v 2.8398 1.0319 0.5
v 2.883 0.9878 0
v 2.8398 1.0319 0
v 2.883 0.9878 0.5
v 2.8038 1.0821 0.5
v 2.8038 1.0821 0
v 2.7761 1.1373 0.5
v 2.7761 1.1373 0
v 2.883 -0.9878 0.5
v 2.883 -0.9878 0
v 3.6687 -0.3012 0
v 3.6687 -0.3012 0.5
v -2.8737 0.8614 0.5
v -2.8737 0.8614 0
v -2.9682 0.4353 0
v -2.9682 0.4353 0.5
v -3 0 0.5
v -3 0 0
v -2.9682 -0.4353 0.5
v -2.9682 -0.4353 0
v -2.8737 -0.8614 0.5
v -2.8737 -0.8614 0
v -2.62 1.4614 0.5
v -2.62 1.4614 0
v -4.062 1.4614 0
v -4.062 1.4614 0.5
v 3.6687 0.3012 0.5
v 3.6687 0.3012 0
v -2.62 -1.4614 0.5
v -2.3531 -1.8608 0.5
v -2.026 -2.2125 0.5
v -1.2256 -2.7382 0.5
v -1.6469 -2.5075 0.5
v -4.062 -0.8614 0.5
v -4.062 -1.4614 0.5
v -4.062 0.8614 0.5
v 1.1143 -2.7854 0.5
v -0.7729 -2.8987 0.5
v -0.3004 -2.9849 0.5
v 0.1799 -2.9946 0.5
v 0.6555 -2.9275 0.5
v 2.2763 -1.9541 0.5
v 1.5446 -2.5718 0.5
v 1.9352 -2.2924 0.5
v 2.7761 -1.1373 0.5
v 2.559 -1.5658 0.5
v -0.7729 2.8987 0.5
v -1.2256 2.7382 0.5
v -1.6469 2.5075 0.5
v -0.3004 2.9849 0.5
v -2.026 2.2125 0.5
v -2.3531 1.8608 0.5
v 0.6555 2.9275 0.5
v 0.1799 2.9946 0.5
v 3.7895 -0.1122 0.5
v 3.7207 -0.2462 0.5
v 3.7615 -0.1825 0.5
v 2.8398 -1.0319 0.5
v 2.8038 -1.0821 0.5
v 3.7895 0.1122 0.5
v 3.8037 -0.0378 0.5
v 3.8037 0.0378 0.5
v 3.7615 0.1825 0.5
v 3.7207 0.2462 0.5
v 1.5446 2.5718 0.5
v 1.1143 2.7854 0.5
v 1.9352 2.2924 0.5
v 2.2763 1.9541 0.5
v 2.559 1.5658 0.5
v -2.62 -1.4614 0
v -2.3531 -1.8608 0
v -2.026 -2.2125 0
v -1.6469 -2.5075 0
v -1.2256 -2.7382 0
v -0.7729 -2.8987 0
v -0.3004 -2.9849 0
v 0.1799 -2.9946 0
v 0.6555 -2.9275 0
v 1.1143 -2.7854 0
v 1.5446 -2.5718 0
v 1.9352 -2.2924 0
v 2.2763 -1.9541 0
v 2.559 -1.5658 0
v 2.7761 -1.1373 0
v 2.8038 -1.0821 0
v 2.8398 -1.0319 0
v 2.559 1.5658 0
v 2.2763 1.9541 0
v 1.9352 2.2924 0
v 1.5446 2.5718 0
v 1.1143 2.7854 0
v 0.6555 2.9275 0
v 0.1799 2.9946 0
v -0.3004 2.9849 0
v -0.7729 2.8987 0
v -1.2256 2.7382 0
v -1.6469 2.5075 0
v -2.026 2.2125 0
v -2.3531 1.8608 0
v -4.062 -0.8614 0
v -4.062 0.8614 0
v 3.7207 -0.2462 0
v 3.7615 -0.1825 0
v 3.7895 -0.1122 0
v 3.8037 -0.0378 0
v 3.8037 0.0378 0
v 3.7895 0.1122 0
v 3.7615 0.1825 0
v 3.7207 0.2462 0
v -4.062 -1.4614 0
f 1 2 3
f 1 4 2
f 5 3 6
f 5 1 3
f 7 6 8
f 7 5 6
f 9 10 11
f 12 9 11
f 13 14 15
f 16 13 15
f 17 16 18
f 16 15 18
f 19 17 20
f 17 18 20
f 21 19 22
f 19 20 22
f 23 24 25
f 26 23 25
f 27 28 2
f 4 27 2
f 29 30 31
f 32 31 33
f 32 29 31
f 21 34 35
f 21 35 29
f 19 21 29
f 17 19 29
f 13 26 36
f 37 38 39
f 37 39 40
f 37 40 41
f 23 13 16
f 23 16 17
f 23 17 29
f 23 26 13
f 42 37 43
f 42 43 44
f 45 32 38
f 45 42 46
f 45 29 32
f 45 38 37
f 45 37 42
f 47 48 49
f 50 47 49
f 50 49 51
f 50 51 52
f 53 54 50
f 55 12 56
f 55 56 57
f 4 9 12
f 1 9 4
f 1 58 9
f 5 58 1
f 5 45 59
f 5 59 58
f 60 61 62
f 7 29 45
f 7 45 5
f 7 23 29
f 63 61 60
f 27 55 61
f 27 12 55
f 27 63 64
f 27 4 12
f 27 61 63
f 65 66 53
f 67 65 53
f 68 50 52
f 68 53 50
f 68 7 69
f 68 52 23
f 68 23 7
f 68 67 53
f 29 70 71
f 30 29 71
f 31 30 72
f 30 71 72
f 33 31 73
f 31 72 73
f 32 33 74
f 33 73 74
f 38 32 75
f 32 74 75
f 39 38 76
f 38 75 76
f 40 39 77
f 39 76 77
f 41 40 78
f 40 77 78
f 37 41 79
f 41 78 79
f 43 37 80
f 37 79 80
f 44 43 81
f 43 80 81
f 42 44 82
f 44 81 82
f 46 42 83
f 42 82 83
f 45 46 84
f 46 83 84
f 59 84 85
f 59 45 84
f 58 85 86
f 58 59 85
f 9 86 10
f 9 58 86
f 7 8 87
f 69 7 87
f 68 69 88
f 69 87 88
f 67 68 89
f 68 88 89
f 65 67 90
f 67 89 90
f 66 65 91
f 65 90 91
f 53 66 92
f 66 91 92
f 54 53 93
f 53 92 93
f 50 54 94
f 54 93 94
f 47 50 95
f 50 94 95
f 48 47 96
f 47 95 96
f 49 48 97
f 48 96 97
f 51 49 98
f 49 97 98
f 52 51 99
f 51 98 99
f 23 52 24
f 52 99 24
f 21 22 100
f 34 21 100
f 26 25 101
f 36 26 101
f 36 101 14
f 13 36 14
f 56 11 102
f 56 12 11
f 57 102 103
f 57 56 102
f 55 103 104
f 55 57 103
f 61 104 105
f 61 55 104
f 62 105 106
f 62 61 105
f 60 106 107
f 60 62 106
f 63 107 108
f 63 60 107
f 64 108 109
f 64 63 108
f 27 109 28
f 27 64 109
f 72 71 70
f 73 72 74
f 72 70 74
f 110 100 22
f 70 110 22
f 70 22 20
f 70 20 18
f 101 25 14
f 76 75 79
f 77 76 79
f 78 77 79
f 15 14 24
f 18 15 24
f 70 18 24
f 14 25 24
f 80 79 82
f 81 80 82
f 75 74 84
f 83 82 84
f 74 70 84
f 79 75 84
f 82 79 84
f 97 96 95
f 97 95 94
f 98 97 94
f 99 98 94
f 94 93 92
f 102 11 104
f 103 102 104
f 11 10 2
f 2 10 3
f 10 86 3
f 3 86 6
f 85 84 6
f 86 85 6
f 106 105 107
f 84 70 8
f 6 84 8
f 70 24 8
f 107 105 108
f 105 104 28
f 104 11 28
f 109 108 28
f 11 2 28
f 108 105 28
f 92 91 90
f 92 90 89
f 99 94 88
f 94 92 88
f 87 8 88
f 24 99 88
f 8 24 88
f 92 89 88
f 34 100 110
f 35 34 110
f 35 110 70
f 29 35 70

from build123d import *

# Parameters (mm, degrees)
F1_DEPTH = 0.5
F2_R     = 0.4


with BuildPart() as f1:
    # F0 (on Top) → F1 (new body)
    with BuildSketch(Plane.XY):
        with BuildLine():
            Line((-4.062, 0.861426), (-2.873664, 0.861426))
            ThreePointArc((-2.873664, 0.861426), (-3, 0), (-2.873664, -0.861426))
            Line((-2.873664, -0.861426), (-4.062, -0.861426))
            Line((-4.062, -0.861426), (-4.062, -1.461426))
            Line((-4.062, -1.461426), (-2.619968, -1.461426))
            ThreePointArc((-2.619968, -1.461426), (0.225595, -2.991506), (2.809509, -1.051979))
            Line((2.809509, -1.051979), (4.013425, 0))
            Line((4.013425, 0), (2.809509, 1.051979))
            ThreePointArc((2.809509, 1.051979), (0.225595, 2.991506), (-2.619968, 1.461426))
            Line((-2.619968, 1.461426), (-4.062, 1.461426))
            Line((-4.062, 1.461426), (-4.062, 0.861426))
        make_face()
    extrude(amount=F1_DEPTH)

    # F2
    f2_edges = [f1.edges().sort_by_distance(p)[0] for p in [
        (4.013425, 0, 0.25),
        (2.809509, 1.051979, 0.25),
        (2.809509, -1.051979, 0.25),
    ]]
    fillet(f2_edges, radius=F2_R)


solid = f1.part
